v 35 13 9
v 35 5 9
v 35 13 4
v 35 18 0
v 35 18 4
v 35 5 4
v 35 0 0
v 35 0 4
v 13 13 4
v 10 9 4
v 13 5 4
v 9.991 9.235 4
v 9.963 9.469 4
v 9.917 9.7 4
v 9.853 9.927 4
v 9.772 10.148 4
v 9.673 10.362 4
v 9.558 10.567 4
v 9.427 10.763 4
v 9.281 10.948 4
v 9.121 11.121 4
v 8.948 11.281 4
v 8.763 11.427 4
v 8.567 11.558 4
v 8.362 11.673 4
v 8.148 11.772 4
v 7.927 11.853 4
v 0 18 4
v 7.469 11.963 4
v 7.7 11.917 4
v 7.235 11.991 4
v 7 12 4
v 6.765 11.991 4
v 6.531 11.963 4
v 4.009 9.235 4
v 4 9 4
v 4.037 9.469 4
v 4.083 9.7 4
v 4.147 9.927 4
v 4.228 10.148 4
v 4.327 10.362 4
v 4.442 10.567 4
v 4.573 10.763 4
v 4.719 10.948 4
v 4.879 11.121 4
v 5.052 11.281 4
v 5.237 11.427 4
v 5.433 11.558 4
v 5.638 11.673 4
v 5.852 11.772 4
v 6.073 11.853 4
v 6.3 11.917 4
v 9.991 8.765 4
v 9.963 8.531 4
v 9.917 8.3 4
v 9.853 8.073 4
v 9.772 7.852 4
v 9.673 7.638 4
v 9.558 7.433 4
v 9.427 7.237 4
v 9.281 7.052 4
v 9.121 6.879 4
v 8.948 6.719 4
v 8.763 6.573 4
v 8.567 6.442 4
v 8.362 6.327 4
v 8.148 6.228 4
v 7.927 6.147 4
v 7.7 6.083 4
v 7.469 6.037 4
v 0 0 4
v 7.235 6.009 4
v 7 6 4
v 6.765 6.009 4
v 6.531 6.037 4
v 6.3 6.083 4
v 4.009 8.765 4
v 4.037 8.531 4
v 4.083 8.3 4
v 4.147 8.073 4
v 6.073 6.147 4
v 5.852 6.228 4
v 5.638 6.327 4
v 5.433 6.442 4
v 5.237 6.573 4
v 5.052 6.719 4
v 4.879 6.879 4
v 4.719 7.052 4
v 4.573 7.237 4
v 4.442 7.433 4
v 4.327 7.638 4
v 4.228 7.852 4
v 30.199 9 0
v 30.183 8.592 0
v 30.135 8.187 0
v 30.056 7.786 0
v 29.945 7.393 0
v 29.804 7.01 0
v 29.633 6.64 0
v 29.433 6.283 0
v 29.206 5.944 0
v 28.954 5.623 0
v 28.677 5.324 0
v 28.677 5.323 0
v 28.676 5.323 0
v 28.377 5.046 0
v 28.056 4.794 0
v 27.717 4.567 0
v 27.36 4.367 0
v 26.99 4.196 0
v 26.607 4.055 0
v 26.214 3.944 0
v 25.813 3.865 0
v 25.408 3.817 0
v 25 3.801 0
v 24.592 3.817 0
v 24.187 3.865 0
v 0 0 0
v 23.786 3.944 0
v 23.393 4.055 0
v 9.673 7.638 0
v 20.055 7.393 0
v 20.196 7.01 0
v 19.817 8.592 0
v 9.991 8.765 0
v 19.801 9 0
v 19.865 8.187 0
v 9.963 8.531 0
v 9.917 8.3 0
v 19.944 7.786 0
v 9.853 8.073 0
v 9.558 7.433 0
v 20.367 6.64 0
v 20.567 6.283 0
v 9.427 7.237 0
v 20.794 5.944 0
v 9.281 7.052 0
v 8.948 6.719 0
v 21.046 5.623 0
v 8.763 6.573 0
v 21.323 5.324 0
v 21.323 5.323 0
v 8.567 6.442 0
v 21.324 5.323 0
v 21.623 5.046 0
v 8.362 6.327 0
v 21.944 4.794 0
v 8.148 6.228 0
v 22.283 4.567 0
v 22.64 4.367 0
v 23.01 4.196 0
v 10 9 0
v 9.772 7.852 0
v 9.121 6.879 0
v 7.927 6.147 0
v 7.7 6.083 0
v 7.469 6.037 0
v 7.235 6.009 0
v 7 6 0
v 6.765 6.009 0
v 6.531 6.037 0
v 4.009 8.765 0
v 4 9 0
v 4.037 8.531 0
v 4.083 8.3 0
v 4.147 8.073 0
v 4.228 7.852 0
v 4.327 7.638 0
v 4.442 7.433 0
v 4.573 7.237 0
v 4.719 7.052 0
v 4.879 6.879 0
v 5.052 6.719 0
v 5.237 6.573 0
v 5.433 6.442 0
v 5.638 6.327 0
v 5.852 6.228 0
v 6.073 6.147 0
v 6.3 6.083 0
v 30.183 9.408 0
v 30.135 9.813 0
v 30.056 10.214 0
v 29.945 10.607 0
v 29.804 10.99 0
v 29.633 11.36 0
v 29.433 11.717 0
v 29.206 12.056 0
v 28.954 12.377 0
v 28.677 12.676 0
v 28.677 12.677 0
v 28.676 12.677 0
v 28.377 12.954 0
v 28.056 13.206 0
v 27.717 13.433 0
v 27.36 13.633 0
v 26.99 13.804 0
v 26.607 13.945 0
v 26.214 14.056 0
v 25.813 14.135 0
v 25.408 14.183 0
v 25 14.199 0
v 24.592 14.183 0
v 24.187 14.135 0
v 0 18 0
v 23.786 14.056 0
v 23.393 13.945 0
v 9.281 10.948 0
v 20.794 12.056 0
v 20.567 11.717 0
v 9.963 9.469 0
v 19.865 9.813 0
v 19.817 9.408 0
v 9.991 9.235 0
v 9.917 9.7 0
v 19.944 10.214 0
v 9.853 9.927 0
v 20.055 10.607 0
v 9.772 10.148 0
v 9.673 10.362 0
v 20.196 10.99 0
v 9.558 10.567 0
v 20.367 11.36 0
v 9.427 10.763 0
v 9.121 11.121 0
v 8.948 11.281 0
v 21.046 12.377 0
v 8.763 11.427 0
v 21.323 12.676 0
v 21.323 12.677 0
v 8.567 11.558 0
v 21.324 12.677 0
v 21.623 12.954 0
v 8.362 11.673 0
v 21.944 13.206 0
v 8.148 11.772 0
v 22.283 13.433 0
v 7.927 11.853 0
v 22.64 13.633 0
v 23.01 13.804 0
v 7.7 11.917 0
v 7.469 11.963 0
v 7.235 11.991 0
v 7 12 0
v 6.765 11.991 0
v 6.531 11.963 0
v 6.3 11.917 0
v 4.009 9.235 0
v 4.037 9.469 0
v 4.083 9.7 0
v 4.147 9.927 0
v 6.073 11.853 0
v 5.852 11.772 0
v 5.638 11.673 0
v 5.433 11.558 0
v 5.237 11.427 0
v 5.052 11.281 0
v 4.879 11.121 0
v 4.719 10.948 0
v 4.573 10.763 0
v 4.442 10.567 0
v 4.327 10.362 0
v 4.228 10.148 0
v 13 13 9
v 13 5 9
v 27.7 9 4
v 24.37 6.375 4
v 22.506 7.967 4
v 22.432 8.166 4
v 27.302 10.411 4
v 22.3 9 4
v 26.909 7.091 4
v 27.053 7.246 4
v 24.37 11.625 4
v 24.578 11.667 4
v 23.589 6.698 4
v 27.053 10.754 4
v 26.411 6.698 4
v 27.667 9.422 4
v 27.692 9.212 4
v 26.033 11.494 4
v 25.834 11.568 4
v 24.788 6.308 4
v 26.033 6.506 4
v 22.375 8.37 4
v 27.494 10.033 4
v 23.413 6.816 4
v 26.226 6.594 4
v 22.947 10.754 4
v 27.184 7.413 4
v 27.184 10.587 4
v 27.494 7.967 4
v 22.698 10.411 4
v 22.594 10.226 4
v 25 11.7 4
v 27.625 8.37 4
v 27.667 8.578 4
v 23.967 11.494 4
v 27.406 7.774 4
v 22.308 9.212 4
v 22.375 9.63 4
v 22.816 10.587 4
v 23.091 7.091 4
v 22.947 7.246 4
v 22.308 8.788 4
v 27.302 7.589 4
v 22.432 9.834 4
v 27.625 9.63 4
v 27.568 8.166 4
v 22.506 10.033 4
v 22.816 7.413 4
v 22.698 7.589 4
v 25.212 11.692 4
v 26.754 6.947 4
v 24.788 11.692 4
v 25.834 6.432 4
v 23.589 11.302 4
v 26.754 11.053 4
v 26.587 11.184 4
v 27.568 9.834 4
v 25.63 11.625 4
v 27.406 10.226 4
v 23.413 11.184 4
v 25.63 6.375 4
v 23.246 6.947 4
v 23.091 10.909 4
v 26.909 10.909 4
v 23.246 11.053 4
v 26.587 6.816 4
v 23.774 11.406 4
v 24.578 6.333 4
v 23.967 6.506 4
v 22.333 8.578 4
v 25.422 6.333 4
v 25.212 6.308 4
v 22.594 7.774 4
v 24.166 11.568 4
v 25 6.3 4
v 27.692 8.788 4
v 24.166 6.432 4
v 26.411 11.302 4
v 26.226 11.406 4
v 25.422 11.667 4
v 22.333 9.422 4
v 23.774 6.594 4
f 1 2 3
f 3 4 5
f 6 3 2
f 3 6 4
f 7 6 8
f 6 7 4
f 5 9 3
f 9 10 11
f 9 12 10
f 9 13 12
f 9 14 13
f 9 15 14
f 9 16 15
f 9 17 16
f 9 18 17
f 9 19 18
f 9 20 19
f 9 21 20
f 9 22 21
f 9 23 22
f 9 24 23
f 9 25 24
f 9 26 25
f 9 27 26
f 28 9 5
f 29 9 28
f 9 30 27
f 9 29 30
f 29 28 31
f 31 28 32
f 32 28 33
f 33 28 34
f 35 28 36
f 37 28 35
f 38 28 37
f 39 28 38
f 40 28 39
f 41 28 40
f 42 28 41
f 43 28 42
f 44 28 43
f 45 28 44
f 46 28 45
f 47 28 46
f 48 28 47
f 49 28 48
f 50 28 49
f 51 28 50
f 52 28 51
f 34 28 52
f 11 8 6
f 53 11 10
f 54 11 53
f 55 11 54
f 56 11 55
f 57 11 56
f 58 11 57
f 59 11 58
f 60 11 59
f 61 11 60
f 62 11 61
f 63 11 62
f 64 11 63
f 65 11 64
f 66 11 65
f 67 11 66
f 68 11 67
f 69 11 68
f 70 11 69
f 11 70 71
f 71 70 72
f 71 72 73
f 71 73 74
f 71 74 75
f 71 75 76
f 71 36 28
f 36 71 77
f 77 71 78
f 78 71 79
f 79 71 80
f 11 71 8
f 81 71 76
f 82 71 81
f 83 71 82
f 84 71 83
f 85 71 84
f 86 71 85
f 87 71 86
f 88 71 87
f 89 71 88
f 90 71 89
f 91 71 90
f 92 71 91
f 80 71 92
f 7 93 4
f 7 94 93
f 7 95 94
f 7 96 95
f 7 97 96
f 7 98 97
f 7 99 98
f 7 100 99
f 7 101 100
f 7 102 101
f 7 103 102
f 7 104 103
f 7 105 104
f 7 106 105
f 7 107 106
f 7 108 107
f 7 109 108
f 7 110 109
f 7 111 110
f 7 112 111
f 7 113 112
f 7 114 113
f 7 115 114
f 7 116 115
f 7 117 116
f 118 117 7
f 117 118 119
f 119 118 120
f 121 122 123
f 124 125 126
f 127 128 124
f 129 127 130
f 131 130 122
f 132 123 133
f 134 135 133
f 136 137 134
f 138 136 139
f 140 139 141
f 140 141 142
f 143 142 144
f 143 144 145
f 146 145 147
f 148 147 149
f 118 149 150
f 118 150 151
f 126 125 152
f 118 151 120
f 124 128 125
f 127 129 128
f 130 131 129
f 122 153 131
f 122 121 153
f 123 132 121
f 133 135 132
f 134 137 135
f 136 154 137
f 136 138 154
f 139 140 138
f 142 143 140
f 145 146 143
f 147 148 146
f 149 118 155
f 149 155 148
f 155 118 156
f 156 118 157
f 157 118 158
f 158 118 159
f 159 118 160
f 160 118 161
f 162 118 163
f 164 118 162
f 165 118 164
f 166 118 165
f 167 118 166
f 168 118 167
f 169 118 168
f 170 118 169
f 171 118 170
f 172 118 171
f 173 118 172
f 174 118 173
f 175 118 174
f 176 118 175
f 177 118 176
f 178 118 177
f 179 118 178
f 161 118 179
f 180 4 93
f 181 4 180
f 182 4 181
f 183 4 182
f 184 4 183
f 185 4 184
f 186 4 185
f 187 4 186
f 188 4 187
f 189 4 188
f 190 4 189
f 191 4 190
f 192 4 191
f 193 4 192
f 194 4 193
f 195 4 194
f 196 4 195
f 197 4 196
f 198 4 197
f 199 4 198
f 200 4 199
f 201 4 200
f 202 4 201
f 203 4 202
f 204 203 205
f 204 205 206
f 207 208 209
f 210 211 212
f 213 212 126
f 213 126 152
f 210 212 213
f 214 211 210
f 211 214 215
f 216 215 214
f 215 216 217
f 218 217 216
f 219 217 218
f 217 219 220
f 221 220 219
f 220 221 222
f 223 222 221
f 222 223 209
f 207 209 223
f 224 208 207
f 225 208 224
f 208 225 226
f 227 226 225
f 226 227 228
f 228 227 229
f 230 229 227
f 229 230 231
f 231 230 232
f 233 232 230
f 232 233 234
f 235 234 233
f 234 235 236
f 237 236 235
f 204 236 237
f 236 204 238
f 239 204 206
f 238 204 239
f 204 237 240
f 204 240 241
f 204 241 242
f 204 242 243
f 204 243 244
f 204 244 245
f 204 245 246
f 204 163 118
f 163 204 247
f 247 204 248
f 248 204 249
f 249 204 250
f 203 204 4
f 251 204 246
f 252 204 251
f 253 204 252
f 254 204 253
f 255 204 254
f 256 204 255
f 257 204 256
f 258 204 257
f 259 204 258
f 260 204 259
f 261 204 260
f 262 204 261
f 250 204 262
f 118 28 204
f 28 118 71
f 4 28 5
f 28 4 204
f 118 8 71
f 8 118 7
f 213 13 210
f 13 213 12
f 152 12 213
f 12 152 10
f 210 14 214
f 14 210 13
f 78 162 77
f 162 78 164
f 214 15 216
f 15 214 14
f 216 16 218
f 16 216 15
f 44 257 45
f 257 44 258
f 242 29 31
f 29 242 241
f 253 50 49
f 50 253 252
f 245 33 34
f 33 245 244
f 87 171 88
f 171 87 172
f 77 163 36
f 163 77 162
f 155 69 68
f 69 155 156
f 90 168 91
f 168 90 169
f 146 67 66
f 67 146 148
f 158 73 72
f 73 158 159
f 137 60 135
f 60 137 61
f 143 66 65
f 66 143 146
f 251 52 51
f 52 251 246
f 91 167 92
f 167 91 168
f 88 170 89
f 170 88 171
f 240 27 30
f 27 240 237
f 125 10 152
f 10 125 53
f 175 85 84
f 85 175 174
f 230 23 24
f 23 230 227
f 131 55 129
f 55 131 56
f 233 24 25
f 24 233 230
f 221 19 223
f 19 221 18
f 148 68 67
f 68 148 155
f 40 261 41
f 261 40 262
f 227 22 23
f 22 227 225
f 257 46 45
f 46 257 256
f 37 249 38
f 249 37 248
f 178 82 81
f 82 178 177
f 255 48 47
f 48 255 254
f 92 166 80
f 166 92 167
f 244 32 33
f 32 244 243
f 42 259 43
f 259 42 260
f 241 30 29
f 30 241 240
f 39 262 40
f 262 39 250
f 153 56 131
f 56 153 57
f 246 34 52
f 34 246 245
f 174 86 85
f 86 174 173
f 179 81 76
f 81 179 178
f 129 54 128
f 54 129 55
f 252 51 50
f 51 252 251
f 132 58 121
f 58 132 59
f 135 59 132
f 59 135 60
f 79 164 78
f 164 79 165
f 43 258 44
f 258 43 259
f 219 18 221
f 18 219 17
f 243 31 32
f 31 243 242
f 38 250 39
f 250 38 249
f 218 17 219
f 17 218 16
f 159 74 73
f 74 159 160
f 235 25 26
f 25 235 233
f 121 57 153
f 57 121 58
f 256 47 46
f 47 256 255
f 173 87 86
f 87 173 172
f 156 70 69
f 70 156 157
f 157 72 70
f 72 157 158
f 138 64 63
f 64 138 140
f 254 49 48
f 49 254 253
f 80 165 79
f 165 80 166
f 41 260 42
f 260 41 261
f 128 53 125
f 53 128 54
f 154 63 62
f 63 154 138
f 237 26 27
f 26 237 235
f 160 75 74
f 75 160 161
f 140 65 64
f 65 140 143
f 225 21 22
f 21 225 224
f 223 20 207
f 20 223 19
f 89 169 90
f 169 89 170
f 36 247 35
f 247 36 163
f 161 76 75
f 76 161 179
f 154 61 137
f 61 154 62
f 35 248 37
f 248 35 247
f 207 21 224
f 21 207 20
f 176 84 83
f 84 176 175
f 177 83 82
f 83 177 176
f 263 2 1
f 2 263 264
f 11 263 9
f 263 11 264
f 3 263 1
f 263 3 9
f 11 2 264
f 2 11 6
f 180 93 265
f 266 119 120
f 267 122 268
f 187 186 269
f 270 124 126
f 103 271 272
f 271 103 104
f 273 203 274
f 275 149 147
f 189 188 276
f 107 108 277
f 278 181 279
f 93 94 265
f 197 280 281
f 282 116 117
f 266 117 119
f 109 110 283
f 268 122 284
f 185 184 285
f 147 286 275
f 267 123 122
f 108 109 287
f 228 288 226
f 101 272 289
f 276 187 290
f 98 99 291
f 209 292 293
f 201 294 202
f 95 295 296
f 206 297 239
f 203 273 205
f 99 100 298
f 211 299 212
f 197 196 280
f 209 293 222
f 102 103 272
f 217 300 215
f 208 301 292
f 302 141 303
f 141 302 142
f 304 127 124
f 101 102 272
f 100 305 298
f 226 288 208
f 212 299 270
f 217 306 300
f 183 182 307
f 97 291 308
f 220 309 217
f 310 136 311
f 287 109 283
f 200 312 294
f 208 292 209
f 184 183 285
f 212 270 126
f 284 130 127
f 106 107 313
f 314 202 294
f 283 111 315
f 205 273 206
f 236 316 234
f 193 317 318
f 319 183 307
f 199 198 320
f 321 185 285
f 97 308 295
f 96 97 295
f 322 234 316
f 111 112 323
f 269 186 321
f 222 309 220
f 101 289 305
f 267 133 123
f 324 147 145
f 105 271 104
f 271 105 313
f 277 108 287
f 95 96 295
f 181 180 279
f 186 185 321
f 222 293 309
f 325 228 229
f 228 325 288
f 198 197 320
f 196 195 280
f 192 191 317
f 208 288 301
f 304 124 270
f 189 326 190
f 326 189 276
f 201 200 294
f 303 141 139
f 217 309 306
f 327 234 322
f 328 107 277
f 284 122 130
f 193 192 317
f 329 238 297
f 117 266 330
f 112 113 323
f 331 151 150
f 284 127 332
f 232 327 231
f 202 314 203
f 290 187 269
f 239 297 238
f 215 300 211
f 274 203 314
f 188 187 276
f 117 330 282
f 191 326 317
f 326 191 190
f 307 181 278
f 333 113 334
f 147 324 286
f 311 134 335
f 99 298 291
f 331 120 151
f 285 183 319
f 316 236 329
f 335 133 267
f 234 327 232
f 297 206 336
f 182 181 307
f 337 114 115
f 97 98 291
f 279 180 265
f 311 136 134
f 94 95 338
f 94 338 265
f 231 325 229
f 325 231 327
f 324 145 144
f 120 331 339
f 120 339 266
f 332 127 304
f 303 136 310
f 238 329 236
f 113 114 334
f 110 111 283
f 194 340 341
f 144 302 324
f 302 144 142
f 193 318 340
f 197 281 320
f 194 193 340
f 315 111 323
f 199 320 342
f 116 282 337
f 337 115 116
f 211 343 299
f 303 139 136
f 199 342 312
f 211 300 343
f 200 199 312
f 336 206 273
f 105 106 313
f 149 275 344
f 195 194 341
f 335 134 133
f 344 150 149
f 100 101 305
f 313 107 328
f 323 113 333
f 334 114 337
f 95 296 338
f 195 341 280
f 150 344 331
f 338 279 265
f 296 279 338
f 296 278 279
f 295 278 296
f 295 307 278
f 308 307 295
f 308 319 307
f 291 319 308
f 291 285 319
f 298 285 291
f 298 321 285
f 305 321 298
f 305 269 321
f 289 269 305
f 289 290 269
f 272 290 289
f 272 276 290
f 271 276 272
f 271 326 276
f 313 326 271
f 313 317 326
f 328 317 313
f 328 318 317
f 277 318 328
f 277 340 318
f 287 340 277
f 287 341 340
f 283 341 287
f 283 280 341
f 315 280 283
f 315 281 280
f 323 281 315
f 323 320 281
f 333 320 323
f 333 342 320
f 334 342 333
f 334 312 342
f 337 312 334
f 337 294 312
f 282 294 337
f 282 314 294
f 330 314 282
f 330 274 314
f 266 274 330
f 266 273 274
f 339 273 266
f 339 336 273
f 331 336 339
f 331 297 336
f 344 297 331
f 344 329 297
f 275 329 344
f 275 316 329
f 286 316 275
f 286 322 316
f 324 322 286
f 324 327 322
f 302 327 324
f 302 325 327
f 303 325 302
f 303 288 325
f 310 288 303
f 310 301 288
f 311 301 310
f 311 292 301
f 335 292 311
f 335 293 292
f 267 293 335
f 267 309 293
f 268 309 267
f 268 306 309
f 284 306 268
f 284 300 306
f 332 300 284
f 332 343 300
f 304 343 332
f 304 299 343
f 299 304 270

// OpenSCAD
difference(){
    union(){
        translate([13,5,4-0.001])
        cube(size=[22,8,5+0.001]);

        difference(){
            cube([35,18,4]);
            translate([7,9,-0.001])
            cylinder(4+0.002,3,3,$fn=80);
        }
    }
    translate([25,9,-0.001])
    cylinder(4+0.001,5.2,2.7,$fn=80);
}
